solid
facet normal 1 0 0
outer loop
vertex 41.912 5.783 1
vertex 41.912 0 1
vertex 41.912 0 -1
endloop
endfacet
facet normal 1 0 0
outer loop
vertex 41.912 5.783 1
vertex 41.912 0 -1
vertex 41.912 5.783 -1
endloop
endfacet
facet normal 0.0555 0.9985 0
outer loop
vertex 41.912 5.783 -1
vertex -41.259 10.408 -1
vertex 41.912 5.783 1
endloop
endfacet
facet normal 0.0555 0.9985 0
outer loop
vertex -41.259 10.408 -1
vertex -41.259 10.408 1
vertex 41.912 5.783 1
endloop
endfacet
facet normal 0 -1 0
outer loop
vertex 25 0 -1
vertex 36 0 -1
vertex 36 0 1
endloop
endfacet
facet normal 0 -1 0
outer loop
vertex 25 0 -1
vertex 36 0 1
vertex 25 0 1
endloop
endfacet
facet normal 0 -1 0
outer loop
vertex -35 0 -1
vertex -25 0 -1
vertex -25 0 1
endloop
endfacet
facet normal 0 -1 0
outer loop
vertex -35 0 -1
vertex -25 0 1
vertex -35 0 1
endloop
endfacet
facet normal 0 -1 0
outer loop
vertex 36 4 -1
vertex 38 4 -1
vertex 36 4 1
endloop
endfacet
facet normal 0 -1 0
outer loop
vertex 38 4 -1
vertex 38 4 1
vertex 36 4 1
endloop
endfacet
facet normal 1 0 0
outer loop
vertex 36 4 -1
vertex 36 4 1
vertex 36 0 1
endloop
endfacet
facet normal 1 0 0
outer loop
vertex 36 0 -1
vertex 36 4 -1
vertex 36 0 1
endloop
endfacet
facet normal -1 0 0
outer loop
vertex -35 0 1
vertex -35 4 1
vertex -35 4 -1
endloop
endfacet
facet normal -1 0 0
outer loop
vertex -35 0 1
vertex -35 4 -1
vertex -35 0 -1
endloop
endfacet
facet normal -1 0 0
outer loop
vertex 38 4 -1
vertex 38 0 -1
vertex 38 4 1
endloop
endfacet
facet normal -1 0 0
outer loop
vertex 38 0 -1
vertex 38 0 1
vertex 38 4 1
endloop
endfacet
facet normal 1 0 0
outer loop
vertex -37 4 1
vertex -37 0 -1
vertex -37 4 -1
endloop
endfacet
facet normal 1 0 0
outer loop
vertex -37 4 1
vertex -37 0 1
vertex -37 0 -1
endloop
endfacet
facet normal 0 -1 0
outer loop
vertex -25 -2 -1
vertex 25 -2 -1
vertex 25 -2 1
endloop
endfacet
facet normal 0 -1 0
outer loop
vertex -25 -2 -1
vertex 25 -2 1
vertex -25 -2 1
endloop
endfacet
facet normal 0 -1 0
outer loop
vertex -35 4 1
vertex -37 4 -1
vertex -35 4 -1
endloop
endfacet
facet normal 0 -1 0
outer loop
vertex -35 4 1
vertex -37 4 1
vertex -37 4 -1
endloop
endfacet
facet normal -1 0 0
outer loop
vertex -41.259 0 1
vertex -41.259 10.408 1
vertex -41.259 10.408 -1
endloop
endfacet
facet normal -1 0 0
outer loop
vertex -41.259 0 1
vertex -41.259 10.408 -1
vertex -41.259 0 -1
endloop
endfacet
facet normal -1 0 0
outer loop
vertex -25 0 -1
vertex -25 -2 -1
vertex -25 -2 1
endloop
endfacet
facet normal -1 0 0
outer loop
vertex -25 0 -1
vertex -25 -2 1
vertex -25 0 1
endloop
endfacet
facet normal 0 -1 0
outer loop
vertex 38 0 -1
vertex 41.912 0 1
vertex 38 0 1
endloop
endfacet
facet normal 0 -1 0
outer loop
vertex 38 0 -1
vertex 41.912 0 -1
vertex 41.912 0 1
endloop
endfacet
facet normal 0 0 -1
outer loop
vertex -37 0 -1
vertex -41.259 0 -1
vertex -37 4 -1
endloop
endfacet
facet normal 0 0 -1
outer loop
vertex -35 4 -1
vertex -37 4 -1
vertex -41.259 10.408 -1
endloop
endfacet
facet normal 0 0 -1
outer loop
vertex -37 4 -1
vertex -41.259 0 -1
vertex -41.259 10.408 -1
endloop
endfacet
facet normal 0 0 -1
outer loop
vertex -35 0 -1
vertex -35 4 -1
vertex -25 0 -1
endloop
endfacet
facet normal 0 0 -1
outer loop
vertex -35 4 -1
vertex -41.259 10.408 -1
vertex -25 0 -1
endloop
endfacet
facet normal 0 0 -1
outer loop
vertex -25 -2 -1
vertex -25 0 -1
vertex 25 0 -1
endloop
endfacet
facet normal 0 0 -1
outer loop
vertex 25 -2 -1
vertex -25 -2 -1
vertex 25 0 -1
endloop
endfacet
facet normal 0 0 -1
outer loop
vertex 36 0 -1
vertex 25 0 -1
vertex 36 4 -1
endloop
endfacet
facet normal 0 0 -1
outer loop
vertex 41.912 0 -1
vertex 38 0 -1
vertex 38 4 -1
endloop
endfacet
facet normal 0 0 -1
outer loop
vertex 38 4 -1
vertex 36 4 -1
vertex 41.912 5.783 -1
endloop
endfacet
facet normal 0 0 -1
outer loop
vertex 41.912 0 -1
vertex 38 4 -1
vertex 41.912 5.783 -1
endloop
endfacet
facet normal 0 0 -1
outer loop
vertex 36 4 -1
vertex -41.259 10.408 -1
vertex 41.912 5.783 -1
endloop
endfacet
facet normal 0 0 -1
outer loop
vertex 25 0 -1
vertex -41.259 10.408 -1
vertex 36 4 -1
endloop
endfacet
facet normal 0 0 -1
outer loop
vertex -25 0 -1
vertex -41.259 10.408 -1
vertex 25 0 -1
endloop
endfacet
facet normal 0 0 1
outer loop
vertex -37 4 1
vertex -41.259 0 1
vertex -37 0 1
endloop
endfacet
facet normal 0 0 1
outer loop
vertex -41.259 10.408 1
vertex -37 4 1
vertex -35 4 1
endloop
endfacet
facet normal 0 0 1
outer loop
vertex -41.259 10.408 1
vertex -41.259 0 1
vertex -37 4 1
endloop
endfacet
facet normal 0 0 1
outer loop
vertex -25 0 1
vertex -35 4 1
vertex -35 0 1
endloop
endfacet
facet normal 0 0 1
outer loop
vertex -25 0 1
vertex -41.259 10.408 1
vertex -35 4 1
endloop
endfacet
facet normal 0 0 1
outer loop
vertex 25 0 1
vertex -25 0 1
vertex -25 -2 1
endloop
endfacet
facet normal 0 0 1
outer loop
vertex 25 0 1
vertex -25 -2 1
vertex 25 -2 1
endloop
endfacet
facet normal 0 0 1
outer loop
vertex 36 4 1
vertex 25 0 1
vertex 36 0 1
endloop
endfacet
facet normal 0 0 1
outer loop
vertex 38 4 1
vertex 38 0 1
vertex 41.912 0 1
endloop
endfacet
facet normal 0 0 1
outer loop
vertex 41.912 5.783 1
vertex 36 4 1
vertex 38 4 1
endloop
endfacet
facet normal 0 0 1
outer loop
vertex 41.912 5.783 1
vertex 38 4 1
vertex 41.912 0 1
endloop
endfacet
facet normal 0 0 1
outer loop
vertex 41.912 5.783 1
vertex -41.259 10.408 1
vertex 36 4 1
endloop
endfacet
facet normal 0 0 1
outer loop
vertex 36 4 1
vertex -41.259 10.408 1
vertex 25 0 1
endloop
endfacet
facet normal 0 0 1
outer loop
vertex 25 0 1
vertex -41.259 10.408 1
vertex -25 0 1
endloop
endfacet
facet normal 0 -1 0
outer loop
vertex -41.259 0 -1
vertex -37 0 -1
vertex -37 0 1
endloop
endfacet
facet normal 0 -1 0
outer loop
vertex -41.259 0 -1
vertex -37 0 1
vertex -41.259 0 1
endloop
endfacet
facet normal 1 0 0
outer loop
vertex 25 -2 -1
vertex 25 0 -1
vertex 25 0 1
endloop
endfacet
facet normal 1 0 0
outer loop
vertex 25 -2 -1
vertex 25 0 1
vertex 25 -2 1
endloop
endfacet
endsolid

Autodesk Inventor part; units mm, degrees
ref_plane "YZ Plane" through (0, 0, 0) normal (1, 0, 0) x (0, 1, 0)
ref_plane "XZ Plane" through (0, 0, 0) normal (0, 1, 0) x (-1, 0, 0)
ref_plane "XY Plane" through (0, 0, 0) normal (0, 0, 1) x (1, 0, 0)
sketch "Sketch1" plane through (0, 0, 0) normal (0, 0, 1) x (1, 0, 0)
  line L0 (-64, 50) -> (64, 50)
  line L1 (64, 50) -> (64, 0)
  line L2 (64, 0) -> (-64, 0)
  line L3 (-64, 0) -> (-64, 50)
  line L4 (-25, 0) -> (25, 0)
  line L5 (25, 0) -> (25, -2)
  line L6 (25, -2) -> (-25, -2)
  line L7 (-25, -2) -> (-25, 0)
  point P0 (0, 0)
  point P1 (0, 0)
  dimension "d0" = 50
  dimension "d1" = 128
  dimension "d2" = 2
  dimension "d3" = 50
extrude "Extrusion1" add sketch "Sketch1" along normal mid plane 2
sketch "Sketch2" plane through (0, 0, 1) normal (0, 0, 1) x (1, 0, 0)
  line L0 (-37.004, 19.1647) -> (37.8795, 15.001) projected
  line L1 (37.8795, 15.001) -> (37.8795, 6.0072) projected
  line L2 (37.8795, 6.0072) -> (-37.004, 10.1709) projected
  line L3 (-37.004, 10.1709) -> (-37.004, 19.1647) projected
  line L4 (41.9117, 3.4023) -> (41.9117, 13.1647) projected
  line L5 (-41.259, 17.7892) -> (-41.259, 8.0268) projected
  point P0 (0, 0)
sketch "Sketch3" plane through (0, 0, 1) normal (0, 0, 1) x (1, 0, 0)
  line L0 (-41.259, 17.7892) -> (-41.259, 8.0268) construction
  line L1 (37.8795, 6.0072) -> (-37.004, 10.1709) construction
  line L2 (41.9117, 3.4023) -> (41.9117, 13.1647) construction
  line L3 (-41.259, 10.4075) -> (41.9117, 5.783)
  line L4 (-41.259, 10.4075) -> (-41.259, 0)
  line L5 (-41.259, 0) -> (-91.259, 0)
  line L6 (-91.259, 0) -> (-91.259, 60)
  line L7 (-91.259, 60) -> (91.9117, 60)
  line L8 (91.9117, 60) -> (91.9117, 0)
  line L9 (91.9117, 0) -> (41.9117, 0)
  line L10 (41.9117, 0) -> (41.9117, 5.783)
  point P0 (0, 0)
  dimension "d6" = 50
  dimension "d7" = 50
  dimension "d8" = 60
extrude "Extrusion2" cut sketch "Sketch3" against normal through all
sketch "Sketch4" plane through (0, 0, 1) normal (0, 0, 1) x (1, 0, 0)
  line L0 (-37, 0) -> (-37, 9.5832) projected
  line L1 (-35, 0) -> (-37, 0) projected
  line L2 (-35, 9.5832) -> (-35, 0) projected
  line L3 (-35, 9.5832) -> (-37, 9.5832) projected
  line L4 (36, 0) -> (36, 5.3914) projected
  line L5 (38, 0) -> (36, 0) projected
  line L6 (38, 5.3914) -> (38, 0) projected
  line L7 (38, 5.3914) -> (36, 5.3914) projected
  point P0 (0, 0)
sketch "Sketch5" plane through (0, 0, 1) normal (0, 0, 1) x (1, 0, 0)
  line L0 (-37, 0) -> (-37, 9.5832) construction
  line L1 (-35, 9.5832) -> (-35, 0) construction
  line L2 (36, 0) -> (36, 5.3914) construction
  line L3 (38, 5.3914) -> (38, 0) construction
  line L4 (-37, 4) -> (-35, 4)
  line L5 (-35, 4) -> (-35, 0)
  line L6 (-35, 0) -> (-37, 0)
  line L7 (-37, 0) -> (-37, 4)
  line L8 (38, 4) -> (36, 4)
  line L9 (36, 4) -> (36, 0)
  line L10 (36, 0) -> (38, 0)
  line L11 (38, 0) -> (38, 4)
  point P0 (0, 0)
  dimension "d11" = 4
  dimension "d12" = 4
extrude "Extrusion3" cut sketch "Sketch5" against normal through all
properties part number "angle_plate_short_short"
